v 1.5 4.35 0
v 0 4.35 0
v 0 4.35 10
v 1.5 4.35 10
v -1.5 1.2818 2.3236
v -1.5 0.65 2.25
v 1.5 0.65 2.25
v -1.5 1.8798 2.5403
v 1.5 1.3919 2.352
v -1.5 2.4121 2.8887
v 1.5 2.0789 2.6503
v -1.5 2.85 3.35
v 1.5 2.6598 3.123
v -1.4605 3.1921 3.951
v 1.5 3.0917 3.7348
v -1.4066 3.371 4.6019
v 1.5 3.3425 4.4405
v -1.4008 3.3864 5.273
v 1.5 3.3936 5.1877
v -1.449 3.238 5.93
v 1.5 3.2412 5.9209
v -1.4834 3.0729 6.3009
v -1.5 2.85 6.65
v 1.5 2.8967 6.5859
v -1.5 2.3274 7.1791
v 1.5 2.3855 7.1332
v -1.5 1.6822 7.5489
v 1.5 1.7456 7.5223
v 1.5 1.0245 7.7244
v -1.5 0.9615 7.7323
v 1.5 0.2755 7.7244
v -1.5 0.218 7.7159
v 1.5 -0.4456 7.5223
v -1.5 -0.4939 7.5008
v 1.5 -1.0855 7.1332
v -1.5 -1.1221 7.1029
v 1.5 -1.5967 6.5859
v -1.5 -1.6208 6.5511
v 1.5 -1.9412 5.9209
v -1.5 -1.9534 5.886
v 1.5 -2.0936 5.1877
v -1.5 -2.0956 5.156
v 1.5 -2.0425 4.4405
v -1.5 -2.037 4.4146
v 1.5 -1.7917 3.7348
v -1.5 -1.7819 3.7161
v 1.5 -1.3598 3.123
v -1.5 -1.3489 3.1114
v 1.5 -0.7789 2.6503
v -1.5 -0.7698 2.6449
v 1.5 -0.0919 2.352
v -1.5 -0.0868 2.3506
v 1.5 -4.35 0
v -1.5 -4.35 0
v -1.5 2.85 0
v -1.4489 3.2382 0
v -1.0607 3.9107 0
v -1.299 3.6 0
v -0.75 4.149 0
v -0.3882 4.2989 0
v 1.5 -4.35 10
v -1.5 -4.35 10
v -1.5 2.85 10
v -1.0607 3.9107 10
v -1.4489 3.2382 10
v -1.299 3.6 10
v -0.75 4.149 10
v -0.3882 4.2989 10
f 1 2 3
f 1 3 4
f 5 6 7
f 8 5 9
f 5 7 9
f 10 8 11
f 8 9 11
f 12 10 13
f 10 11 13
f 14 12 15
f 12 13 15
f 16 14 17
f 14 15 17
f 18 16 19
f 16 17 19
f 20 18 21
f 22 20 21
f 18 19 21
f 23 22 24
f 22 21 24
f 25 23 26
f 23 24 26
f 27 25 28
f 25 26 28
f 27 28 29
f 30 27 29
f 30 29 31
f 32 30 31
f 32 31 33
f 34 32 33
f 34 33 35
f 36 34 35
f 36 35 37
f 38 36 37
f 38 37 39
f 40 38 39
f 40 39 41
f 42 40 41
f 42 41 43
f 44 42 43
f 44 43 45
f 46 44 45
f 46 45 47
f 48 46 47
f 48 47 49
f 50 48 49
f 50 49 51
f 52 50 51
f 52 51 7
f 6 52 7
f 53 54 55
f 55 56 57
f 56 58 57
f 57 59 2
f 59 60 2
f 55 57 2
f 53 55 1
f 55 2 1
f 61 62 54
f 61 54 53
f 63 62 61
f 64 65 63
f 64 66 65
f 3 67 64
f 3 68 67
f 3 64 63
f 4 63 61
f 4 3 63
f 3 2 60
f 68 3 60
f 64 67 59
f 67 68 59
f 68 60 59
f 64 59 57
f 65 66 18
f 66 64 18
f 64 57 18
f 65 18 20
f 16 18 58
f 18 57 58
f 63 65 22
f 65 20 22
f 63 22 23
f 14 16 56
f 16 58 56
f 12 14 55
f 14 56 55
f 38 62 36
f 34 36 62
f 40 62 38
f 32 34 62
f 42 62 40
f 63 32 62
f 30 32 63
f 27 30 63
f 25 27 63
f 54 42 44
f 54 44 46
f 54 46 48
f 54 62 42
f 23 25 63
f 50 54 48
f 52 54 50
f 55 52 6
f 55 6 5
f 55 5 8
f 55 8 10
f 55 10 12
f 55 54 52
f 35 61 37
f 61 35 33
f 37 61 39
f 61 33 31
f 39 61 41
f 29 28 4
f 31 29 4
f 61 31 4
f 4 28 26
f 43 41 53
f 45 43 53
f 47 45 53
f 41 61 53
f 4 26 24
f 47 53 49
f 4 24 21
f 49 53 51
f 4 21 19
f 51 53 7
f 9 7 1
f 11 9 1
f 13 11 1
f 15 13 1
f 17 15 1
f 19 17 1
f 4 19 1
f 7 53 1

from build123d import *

# Parameters (mm, degrees)
SKETCH_1_W          = 3
SKETCH_1_H          = 8.7
EXTRUDE_1_DEPTH     = 10
SKETCH_2_R          = 2.75
CUT_EXTRUDE_1_DEPTH = 10
FILLET_1_R          = 1.5


with BuildPart() as part:
    # 草图1 → 凸台-拉伸1 (new body)
    with BuildSketch(Plane.XY):
        Rectangle(SKETCH_1_W, SKETCH_1_H)
    extrude(amount=EXTRUDE_1_DEPTH)

    # 草图2 → 切除-拉伸1 (cut)
    with BuildSketch(Plane(origin=(1.5, 0, 0), x_dir=(0, 0, -1), z_dir=(1, 0, 0))):
        with Locations((-5, 0.65)):
            Circle(SKETCH_2_R)
    extrude(amount=-CUT_EXTRUDE_1_DEPTH, mode=Mode.SUBTRACT)

    # 圆角1
    # the kernel refuses this fillet: 1.5 mm, written as the material it takes off along each edge
    with BuildSketch(Plane(origin=(-1.5, 4.35, -3.75), x_dir=(0, -1, 0), z_dir=(0, 0, 1))) as fillet_1_piece_1:
        with BuildLine():
            CenterArc((FILLET_1_R, FILLET_1_R), FILLET_1_R, 180, 90)
            Line((0, FILLET_1_R), (0, 0))
            Line((0, 0), (FILLET_1_R, 0))
        make_face()
    extrude(amount=17.5, mode=Mode.SUBTRACT)


solid = part.part
